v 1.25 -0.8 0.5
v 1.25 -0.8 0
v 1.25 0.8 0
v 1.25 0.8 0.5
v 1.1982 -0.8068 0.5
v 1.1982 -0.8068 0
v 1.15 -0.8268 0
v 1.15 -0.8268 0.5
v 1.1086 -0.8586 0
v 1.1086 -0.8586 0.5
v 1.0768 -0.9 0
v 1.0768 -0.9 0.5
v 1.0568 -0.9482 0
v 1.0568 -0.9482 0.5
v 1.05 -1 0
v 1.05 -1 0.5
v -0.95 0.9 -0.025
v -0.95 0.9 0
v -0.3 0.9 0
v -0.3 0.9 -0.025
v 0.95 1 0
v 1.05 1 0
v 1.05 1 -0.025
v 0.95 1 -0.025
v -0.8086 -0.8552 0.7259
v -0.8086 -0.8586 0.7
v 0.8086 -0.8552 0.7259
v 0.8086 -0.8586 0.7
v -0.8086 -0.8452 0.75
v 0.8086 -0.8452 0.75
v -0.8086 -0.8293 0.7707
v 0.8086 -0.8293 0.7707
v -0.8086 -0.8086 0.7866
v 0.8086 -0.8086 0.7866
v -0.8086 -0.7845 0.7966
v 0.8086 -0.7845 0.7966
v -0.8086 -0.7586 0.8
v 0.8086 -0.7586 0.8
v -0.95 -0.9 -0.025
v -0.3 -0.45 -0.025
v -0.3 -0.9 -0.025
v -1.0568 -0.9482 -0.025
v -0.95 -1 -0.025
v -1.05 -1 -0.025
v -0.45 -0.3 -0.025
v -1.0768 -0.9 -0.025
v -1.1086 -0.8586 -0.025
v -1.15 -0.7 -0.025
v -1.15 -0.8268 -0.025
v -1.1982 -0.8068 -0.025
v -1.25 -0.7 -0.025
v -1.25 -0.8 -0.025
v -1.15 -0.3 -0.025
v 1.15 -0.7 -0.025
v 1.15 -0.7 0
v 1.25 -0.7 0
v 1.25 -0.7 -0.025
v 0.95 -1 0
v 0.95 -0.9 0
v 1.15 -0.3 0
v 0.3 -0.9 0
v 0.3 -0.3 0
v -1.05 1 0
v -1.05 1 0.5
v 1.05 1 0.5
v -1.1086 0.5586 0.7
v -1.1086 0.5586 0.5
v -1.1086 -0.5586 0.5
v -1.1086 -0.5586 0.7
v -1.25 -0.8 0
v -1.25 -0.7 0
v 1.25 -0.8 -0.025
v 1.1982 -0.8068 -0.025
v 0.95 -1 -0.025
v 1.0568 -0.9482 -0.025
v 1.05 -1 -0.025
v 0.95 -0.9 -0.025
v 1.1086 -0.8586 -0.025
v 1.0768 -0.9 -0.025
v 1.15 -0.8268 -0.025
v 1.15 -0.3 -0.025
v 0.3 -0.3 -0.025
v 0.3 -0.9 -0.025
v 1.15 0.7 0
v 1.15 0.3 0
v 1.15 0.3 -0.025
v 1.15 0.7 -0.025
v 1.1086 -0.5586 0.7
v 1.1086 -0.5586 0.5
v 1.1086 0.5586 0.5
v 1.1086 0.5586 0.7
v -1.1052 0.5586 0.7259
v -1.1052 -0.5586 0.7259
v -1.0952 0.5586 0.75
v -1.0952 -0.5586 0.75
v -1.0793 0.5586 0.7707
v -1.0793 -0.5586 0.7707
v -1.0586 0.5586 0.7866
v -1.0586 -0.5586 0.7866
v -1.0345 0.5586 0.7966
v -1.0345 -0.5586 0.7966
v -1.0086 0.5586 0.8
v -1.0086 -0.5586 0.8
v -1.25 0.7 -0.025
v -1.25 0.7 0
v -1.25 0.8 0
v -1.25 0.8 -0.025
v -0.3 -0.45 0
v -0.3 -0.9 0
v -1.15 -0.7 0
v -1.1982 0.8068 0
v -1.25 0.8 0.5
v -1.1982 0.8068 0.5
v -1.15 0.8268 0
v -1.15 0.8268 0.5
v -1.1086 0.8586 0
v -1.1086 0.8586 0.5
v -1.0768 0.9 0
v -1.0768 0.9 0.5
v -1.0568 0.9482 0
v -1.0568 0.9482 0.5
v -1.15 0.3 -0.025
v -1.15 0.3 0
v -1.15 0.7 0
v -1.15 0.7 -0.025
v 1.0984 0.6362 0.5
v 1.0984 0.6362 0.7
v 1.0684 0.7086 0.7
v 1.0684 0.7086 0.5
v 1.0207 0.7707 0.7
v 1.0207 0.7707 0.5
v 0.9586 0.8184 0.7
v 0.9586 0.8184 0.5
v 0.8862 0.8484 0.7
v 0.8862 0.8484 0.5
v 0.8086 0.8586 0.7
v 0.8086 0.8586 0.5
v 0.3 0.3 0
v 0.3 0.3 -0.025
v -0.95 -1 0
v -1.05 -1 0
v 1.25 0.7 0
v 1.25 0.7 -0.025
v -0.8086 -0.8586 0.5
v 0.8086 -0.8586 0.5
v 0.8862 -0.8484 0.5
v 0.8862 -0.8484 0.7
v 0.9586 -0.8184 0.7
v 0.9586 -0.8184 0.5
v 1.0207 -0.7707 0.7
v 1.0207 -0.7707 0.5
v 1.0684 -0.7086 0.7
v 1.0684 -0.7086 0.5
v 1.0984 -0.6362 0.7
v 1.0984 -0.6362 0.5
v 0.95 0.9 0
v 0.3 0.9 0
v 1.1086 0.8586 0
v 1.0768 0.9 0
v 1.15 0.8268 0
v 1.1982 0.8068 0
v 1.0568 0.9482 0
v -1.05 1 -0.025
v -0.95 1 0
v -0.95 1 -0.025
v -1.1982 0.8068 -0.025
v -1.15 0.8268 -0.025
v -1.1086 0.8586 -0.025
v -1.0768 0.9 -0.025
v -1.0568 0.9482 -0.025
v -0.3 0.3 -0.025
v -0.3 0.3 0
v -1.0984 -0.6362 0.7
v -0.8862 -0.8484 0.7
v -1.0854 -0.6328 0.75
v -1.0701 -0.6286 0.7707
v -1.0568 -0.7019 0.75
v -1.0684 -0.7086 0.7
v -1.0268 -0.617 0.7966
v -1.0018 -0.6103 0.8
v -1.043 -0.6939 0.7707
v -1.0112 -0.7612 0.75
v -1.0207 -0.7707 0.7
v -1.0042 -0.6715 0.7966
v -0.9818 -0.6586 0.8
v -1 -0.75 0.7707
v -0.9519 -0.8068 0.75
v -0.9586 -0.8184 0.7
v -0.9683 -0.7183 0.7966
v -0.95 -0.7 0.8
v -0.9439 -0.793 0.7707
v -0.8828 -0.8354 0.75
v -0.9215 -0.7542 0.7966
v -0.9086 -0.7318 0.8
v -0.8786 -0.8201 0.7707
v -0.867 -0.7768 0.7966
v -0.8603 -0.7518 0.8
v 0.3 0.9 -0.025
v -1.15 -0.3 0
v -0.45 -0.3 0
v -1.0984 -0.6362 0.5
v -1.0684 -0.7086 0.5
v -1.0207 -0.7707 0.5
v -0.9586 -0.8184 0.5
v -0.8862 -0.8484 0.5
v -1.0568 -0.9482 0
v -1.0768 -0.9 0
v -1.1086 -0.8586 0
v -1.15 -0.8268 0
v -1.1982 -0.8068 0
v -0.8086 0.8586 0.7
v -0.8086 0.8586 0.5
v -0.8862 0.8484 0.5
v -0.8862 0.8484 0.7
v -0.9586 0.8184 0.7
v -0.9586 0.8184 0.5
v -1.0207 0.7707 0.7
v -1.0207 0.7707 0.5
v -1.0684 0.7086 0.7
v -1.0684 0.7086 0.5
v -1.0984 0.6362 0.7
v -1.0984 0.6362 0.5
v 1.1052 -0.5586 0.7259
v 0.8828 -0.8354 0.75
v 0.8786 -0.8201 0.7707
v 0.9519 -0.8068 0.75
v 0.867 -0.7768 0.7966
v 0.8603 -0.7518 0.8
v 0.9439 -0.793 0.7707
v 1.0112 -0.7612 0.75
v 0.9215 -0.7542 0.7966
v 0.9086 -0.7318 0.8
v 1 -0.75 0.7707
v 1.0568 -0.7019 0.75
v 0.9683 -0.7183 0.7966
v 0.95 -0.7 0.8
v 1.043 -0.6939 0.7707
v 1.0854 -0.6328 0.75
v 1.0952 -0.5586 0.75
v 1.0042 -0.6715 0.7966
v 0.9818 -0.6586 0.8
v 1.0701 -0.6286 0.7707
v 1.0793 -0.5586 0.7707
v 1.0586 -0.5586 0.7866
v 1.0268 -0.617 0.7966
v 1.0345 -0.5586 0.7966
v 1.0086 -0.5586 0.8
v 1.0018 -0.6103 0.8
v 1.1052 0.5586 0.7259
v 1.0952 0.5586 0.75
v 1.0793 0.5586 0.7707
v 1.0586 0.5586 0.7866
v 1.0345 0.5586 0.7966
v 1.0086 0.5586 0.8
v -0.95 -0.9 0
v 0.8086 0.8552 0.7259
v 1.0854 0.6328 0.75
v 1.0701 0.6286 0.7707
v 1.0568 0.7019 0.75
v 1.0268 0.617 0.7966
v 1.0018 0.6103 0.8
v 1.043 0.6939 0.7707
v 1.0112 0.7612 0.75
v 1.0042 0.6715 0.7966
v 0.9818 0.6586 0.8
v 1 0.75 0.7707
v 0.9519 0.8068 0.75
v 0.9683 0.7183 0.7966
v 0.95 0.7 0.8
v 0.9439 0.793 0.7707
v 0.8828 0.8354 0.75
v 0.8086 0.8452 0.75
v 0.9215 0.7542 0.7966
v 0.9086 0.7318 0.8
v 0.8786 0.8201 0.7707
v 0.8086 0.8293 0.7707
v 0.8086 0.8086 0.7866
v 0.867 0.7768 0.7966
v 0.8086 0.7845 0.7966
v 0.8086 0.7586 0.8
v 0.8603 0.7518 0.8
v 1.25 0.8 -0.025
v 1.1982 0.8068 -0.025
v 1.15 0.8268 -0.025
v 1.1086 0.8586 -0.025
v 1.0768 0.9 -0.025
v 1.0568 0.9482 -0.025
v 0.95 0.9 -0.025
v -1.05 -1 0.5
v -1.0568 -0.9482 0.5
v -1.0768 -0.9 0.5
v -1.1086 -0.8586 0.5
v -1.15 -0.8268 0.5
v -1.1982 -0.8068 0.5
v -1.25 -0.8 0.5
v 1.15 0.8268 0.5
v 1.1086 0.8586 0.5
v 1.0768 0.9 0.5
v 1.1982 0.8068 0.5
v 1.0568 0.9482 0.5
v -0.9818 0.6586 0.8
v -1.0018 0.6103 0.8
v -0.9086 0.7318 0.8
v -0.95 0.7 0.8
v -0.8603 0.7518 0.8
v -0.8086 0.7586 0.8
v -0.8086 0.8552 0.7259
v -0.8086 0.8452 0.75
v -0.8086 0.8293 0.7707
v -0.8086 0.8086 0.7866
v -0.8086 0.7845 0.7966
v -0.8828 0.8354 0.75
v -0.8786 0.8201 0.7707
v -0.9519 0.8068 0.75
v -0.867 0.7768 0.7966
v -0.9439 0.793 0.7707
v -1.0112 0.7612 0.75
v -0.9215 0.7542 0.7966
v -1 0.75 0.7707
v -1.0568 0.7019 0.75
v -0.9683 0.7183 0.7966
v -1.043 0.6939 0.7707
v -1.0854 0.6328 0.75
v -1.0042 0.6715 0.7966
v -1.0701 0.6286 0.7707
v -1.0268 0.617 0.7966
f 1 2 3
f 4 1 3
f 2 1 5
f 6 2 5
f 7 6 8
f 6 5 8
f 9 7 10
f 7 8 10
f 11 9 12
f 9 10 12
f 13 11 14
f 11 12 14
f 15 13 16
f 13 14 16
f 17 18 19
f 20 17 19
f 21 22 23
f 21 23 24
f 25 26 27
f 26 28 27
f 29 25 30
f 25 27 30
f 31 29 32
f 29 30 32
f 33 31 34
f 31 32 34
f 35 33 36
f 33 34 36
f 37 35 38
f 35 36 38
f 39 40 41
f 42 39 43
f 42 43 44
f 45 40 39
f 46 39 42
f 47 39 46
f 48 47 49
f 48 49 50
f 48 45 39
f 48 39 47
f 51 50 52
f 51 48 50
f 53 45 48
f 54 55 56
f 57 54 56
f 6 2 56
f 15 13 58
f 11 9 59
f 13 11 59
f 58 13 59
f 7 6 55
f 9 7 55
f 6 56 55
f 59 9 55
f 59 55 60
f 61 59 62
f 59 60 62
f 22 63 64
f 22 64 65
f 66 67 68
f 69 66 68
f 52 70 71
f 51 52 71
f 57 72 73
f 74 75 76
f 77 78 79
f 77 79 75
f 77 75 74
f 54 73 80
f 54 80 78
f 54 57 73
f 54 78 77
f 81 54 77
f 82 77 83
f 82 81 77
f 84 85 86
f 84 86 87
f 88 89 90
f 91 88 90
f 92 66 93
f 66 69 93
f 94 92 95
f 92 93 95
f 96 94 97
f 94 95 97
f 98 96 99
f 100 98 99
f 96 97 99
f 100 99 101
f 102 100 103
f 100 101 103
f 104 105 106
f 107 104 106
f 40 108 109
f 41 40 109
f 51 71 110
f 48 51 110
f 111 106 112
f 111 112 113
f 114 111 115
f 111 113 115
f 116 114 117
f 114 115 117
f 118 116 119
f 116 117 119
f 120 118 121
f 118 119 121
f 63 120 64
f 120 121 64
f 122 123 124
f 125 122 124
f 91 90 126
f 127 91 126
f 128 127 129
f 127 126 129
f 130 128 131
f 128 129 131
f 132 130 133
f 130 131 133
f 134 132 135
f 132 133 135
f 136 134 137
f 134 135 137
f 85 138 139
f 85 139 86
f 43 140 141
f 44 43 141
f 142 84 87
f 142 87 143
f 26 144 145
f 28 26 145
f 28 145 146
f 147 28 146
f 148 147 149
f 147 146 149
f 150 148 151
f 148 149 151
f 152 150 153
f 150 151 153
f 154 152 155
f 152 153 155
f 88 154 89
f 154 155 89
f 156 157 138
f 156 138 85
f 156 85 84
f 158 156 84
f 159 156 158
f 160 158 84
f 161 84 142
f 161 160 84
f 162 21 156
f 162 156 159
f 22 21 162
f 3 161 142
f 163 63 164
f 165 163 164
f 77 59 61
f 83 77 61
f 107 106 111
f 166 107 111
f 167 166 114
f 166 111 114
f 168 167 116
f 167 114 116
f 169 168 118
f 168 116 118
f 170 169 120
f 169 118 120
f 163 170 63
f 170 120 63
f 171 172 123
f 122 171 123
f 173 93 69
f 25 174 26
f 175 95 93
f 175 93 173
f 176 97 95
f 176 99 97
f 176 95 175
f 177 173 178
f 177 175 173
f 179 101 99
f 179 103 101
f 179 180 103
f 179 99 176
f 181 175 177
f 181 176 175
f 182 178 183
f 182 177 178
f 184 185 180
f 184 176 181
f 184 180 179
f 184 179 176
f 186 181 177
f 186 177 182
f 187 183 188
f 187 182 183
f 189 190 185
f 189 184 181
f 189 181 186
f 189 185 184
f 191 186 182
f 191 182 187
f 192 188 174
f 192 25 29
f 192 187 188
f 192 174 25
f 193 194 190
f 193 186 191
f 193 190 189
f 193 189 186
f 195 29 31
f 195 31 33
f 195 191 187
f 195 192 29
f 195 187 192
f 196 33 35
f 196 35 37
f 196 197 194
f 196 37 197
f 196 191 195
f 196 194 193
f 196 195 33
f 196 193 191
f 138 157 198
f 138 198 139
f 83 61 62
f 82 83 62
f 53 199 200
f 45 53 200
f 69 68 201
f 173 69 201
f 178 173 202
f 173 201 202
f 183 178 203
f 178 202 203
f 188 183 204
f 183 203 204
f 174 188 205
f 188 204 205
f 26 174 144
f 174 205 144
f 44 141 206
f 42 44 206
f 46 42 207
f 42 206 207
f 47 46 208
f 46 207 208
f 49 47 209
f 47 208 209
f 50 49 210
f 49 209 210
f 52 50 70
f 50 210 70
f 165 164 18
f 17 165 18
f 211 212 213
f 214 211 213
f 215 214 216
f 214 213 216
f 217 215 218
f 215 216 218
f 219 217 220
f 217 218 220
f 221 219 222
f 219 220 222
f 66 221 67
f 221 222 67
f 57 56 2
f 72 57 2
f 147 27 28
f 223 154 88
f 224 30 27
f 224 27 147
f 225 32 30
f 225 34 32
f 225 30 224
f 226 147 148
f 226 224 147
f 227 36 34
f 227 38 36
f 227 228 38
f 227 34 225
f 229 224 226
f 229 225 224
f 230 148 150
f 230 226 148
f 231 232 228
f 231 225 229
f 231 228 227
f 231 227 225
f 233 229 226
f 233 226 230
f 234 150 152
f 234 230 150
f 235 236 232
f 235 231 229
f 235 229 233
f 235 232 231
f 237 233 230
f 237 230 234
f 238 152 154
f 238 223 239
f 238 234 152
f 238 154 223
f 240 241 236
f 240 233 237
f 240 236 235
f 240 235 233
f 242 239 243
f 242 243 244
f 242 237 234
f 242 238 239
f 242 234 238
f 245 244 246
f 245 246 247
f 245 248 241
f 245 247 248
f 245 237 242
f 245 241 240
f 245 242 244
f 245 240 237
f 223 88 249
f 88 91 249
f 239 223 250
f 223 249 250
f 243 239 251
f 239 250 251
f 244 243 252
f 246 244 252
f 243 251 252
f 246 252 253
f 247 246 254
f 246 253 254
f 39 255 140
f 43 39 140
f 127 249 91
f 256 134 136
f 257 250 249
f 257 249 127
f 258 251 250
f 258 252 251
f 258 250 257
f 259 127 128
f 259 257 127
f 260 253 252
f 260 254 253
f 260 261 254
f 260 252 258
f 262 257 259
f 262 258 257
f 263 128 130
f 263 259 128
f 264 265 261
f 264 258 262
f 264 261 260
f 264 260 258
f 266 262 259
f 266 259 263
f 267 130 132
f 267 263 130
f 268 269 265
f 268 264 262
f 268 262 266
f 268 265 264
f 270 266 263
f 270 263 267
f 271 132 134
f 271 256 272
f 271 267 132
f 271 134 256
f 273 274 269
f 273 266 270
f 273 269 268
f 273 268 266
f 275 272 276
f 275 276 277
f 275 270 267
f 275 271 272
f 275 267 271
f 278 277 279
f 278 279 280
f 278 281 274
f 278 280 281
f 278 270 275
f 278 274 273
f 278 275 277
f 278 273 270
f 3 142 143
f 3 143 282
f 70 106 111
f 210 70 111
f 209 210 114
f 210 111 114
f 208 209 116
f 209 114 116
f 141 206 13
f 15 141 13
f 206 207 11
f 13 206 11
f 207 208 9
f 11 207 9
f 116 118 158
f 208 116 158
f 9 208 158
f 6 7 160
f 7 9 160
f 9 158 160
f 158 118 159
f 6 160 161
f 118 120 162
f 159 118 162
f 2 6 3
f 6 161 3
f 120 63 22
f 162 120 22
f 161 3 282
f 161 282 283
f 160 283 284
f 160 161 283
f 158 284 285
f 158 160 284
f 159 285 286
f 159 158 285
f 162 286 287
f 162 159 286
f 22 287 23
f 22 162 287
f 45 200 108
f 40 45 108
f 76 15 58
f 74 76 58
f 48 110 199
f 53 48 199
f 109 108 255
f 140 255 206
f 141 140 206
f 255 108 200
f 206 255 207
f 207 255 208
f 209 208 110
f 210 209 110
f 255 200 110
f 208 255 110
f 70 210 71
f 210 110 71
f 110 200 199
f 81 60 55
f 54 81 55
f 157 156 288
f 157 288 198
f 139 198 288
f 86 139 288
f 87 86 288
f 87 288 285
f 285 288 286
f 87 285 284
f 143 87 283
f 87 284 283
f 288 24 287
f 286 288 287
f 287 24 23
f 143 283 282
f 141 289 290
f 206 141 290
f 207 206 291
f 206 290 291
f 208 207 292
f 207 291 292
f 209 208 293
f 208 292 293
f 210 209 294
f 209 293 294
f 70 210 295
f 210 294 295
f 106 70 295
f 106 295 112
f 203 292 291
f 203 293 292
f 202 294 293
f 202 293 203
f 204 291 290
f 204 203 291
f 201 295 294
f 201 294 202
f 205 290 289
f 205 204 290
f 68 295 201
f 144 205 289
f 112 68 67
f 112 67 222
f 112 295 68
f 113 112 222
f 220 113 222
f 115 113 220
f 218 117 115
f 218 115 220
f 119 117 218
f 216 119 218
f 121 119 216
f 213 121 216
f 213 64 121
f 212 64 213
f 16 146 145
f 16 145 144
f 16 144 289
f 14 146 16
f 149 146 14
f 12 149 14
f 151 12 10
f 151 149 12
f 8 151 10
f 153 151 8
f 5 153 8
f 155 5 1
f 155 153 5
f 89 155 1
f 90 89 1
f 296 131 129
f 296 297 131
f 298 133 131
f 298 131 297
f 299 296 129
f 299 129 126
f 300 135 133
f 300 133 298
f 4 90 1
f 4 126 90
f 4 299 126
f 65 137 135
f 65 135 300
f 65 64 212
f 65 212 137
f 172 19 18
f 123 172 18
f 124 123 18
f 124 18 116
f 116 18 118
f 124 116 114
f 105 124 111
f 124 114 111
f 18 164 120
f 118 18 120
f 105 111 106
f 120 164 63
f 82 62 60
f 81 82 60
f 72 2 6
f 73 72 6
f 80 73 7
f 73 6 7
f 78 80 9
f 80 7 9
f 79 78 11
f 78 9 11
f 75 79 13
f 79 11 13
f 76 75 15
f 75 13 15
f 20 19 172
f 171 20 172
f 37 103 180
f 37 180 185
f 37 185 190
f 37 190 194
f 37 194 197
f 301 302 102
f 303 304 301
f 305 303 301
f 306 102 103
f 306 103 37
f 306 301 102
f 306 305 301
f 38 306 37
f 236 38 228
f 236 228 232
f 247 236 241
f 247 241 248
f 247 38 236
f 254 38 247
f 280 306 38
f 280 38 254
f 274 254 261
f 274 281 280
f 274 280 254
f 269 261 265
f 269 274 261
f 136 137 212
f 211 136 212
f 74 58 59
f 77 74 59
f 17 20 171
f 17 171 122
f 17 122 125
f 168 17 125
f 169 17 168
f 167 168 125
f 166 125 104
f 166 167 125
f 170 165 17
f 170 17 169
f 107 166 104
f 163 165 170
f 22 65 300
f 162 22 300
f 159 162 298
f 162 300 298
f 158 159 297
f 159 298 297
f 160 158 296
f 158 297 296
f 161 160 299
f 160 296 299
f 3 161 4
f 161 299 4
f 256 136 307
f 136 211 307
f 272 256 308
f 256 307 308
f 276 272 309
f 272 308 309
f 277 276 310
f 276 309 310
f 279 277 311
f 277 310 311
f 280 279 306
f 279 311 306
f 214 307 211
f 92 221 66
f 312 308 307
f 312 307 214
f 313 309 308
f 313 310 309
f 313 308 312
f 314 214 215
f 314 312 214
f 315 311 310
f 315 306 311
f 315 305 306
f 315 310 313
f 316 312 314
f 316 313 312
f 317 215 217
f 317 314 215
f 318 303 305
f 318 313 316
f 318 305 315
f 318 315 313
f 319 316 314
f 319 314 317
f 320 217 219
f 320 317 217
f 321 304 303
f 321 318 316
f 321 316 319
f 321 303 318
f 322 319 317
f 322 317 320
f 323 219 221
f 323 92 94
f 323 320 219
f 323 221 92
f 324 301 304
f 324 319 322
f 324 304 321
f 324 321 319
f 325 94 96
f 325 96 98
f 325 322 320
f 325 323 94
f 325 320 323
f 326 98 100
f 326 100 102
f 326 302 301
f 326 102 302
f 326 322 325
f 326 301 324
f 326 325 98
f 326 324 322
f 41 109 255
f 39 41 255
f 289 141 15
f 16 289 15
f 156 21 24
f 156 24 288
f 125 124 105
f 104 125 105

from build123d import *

# Parameters (mm, degrees)
SKETCH1_W             = 2.5
SKETCH1_H             = 2
BOSS_EXTRUDE1_DEPTH   = 0.5
SKETCH2_R             = 0.2
CUT_EXTRUDE1_DEPTH    = 0.5
BOSS_EXTRUDE2_DEPTH   = 0.3
BOSS_EXTRUDE3_DEPTH   = 0.025
BOSS_EXTRUDE3_2_DEPTH = 0.025
BOSS_EXTRUDE3_3_DEPTH = 0.025
BOSS_EXTRUDE3_4_DEPTH = 0.025
FILLET1_R             = 0.1


with BuildPart() as part:
    # Sketch1 → Boss-Extrude1 (new body)
    with BuildSketch(Plane.XY):
        Rectangle(SKETCH1_W, SKETCH1_H)
    extrude(amount=BOSS_EXTRUDE1_DEPTH)

    # Sketch2 → Cut-Extrude1 (cut)
    with BuildSketch(Plane.XY.offset(0.5)):
        with Locations((-1.25, 1)):
            Circle(SKETCH2_R)
        with Locations((1.25, 1)):
            Circle(SKETCH2_R)
        with Locations((-1.25, -1)):
            Circle(SKETCH2_R)
        with Locations((1.25, -1)):
            Circle(SKETCH2_R)
    extrude(amount=-CUT_EXTRUDE1_DEPTH, mode=Mode.SUBTRACT)

    # Sketch3 → Boss-Extrude2 (add)
    with BuildSketch(Plane.XY.offset(0.5)):
        with BuildLine():
            Line((-1.108578644, 0.558578644), (-1.108578644, -0.558578644))
            ThreePointArc((-1.108578644, -0.558578644), (-1.020710678, -0.770710678), (-0.808578644, -0.858578644))
            Line((-0.808578644, -0.858578644), (0.808578644, -0.858578644))
            ThreePointArc((0.808578644, -0.858578644), (1.020710678, -0.770710678), (1.108578644, -0.558578644))
            Line((1.108578644, -0.558578644), (1.108578644, 0.558578644))
            ThreePointArc((1.108578644, 0.558578644), (1.020710678, 0.770710678), (0.808578644, 0.858578644))
            Line((0.808578644, 0.858578644), (-0.808578644, 0.858578644))
            ThreePointArc((-0.808578644, 0.858578644), (-1.020710678, 0.770710678), (-1.108578644, 0.558578644))
        make_face()
    extrude(amount=BOSS_EXTRUDE2_DEPTH)

    # Fillet1
    fillet1_edges = [part.edges().sort_by_distance(p)[0] for p in [
        (-1.020710678, -0.770710678, 0.8),
        (0, -0.858578644, 0.8),
        (1.020710678, -0.770710678, 0.8),
        (1.108578644, 0, 0.8),
        (1.020710678, 0.770710678, 0.8),
        (0, 0.858578644, 0.8),
        (-1.020710678, 0.770710678, 0.8),
        (-1.108578644, 0, 0.8),
    ]]
    fillet(fillet1_edges, radius=FILLET1_R)


with BuildPart() as body_2:
    # Sketch4 → Boss-Extrude3 (new body)
    with BuildSketch(Plane(origin=(0, 0, 0), x_dir=(-1, 0, 0), z_dir=(0, 0, -1))):
        with BuildLine():
            Line((0.45, -0.3), (0.3, -0.45))
            Line((0.3, -0.45), (0.3, -0.9))
            Line((0.3, -0.9), (0.95, -0.9))
            Line((0.95, -0.9), (0.95, -1))
            Line((0.95, -1), (1.05, -1))
            ThreePointArc((1.05, -1), (1.108578644, -0.858578644), (1.25, -0.8))
            Line((1.25, -0.8), (1.25, -0.7))
            Line((1.25, -0.7), (1.15, -0.7))
            Line((1.15, -0.7), (1.15, -0.3))
            Line((1.15, -0.3), (0.45, -0.3))
        make_face()
    extrude(amount=BOSS_EXTRUDE3_DEPTH)


with BuildPart() as body_3:
    # Sketch4 → Boss-Extrude3 2 (new body)
    with BuildSketch(Plane(origin=(0, 0, 0), x_dir=(-1, 0, 0), z_dir=(0, 0, -1))):
        with BuildLine():
            Line((-0.95, 0.9), (-0.3, 0.9))
            Line((-0.3, 0.9), (-0.3, 0.3))
            Line((-0.3, 0.3), (-1.15, 0.3))
            Line((-1.15, 0.3), (-1.15, 0.7))
            Line((-1.15, 0.7), (-1.25, 0.7))
            Line((-1.25, 0.7), (-1.25, 0.8))
            ThreePointArc((-1.25, 0.8), (-1.108578644, 0.858578644), (-1.05, 1))
            Line((-1.05, 1), (-0.95, 1))
            Line((-0.95, 1), (-0.95, 0.9))
        make_face()
    extrude(amount=BOSS_EXTRUDE3_2_DEPTH)


with BuildPart() as body_4:
    # Sketch4 → Boss-Extrude3 3 (new body)
    with BuildSketch(Plane(origin=(0, 0, 0), x_dir=(-1, 0, 0), z_dir=(0, 0, -1))):
        with BuildLine():
            Line((0.95, 1), (0.95, 0.9))
            Line((0.95, 0.9), (0.3, 0.9))
            Line((0.3, 0.9), (0.3, 0.3))
            Line((0.3, 0.3), (1.15, 0.3))
            Line((1.15, 0.3), (1.15, 0.7))
            Line((1.15, 0.7), (1.25, 0.7))
            Line((1.25, 0.7), (1.25, 0.8))
            ThreePointArc((1.25, 0.8), (1.108578644, 0.858578644), (1.05, 1))
            Line((1.05, 1), (0.95, 1))
        make_face()
    extrude(amount=BOSS_EXTRUDE3_3_DEPTH)


with BuildPart() as body_5:
    # Sketch4 → Boss-Extrude3 4 (new body)
    with BuildSketch(Plane(origin=(0, 0, 0), x_dir=(-1, 0, 0), z_dir=(0, 0, -1))):
        with BuildLine():
            Line((-0.95, -1), (-0.95, -0.9))
            Line((-0.95, -0.9), (-0.3, -0.9))
            Line((-0.3, -0.9), (-0.3, -0.3))
            Line((-0.3, -0.3), (-1.15, -0.3))
            Line((-1.15, -0.3), (-1.15, -0.7))
            Line((-1.15, -0.7), (-1.25, -0.7))
            Line((-1.25, -0.7), (-1.25, -0.8))
            ThreePointArc((-1.25, -0.8), (-1.108578644, -0.858578644), (-1.05, -1))
            Line((-1.05, -1), (-0.95, -1))
        make_face()
    extrude(amount=BOSS_EXTRUDE3_4_DEPTH)


solid = Compound([part.part, body_2.part, body_3.part, body_4.part, body_5.part])
